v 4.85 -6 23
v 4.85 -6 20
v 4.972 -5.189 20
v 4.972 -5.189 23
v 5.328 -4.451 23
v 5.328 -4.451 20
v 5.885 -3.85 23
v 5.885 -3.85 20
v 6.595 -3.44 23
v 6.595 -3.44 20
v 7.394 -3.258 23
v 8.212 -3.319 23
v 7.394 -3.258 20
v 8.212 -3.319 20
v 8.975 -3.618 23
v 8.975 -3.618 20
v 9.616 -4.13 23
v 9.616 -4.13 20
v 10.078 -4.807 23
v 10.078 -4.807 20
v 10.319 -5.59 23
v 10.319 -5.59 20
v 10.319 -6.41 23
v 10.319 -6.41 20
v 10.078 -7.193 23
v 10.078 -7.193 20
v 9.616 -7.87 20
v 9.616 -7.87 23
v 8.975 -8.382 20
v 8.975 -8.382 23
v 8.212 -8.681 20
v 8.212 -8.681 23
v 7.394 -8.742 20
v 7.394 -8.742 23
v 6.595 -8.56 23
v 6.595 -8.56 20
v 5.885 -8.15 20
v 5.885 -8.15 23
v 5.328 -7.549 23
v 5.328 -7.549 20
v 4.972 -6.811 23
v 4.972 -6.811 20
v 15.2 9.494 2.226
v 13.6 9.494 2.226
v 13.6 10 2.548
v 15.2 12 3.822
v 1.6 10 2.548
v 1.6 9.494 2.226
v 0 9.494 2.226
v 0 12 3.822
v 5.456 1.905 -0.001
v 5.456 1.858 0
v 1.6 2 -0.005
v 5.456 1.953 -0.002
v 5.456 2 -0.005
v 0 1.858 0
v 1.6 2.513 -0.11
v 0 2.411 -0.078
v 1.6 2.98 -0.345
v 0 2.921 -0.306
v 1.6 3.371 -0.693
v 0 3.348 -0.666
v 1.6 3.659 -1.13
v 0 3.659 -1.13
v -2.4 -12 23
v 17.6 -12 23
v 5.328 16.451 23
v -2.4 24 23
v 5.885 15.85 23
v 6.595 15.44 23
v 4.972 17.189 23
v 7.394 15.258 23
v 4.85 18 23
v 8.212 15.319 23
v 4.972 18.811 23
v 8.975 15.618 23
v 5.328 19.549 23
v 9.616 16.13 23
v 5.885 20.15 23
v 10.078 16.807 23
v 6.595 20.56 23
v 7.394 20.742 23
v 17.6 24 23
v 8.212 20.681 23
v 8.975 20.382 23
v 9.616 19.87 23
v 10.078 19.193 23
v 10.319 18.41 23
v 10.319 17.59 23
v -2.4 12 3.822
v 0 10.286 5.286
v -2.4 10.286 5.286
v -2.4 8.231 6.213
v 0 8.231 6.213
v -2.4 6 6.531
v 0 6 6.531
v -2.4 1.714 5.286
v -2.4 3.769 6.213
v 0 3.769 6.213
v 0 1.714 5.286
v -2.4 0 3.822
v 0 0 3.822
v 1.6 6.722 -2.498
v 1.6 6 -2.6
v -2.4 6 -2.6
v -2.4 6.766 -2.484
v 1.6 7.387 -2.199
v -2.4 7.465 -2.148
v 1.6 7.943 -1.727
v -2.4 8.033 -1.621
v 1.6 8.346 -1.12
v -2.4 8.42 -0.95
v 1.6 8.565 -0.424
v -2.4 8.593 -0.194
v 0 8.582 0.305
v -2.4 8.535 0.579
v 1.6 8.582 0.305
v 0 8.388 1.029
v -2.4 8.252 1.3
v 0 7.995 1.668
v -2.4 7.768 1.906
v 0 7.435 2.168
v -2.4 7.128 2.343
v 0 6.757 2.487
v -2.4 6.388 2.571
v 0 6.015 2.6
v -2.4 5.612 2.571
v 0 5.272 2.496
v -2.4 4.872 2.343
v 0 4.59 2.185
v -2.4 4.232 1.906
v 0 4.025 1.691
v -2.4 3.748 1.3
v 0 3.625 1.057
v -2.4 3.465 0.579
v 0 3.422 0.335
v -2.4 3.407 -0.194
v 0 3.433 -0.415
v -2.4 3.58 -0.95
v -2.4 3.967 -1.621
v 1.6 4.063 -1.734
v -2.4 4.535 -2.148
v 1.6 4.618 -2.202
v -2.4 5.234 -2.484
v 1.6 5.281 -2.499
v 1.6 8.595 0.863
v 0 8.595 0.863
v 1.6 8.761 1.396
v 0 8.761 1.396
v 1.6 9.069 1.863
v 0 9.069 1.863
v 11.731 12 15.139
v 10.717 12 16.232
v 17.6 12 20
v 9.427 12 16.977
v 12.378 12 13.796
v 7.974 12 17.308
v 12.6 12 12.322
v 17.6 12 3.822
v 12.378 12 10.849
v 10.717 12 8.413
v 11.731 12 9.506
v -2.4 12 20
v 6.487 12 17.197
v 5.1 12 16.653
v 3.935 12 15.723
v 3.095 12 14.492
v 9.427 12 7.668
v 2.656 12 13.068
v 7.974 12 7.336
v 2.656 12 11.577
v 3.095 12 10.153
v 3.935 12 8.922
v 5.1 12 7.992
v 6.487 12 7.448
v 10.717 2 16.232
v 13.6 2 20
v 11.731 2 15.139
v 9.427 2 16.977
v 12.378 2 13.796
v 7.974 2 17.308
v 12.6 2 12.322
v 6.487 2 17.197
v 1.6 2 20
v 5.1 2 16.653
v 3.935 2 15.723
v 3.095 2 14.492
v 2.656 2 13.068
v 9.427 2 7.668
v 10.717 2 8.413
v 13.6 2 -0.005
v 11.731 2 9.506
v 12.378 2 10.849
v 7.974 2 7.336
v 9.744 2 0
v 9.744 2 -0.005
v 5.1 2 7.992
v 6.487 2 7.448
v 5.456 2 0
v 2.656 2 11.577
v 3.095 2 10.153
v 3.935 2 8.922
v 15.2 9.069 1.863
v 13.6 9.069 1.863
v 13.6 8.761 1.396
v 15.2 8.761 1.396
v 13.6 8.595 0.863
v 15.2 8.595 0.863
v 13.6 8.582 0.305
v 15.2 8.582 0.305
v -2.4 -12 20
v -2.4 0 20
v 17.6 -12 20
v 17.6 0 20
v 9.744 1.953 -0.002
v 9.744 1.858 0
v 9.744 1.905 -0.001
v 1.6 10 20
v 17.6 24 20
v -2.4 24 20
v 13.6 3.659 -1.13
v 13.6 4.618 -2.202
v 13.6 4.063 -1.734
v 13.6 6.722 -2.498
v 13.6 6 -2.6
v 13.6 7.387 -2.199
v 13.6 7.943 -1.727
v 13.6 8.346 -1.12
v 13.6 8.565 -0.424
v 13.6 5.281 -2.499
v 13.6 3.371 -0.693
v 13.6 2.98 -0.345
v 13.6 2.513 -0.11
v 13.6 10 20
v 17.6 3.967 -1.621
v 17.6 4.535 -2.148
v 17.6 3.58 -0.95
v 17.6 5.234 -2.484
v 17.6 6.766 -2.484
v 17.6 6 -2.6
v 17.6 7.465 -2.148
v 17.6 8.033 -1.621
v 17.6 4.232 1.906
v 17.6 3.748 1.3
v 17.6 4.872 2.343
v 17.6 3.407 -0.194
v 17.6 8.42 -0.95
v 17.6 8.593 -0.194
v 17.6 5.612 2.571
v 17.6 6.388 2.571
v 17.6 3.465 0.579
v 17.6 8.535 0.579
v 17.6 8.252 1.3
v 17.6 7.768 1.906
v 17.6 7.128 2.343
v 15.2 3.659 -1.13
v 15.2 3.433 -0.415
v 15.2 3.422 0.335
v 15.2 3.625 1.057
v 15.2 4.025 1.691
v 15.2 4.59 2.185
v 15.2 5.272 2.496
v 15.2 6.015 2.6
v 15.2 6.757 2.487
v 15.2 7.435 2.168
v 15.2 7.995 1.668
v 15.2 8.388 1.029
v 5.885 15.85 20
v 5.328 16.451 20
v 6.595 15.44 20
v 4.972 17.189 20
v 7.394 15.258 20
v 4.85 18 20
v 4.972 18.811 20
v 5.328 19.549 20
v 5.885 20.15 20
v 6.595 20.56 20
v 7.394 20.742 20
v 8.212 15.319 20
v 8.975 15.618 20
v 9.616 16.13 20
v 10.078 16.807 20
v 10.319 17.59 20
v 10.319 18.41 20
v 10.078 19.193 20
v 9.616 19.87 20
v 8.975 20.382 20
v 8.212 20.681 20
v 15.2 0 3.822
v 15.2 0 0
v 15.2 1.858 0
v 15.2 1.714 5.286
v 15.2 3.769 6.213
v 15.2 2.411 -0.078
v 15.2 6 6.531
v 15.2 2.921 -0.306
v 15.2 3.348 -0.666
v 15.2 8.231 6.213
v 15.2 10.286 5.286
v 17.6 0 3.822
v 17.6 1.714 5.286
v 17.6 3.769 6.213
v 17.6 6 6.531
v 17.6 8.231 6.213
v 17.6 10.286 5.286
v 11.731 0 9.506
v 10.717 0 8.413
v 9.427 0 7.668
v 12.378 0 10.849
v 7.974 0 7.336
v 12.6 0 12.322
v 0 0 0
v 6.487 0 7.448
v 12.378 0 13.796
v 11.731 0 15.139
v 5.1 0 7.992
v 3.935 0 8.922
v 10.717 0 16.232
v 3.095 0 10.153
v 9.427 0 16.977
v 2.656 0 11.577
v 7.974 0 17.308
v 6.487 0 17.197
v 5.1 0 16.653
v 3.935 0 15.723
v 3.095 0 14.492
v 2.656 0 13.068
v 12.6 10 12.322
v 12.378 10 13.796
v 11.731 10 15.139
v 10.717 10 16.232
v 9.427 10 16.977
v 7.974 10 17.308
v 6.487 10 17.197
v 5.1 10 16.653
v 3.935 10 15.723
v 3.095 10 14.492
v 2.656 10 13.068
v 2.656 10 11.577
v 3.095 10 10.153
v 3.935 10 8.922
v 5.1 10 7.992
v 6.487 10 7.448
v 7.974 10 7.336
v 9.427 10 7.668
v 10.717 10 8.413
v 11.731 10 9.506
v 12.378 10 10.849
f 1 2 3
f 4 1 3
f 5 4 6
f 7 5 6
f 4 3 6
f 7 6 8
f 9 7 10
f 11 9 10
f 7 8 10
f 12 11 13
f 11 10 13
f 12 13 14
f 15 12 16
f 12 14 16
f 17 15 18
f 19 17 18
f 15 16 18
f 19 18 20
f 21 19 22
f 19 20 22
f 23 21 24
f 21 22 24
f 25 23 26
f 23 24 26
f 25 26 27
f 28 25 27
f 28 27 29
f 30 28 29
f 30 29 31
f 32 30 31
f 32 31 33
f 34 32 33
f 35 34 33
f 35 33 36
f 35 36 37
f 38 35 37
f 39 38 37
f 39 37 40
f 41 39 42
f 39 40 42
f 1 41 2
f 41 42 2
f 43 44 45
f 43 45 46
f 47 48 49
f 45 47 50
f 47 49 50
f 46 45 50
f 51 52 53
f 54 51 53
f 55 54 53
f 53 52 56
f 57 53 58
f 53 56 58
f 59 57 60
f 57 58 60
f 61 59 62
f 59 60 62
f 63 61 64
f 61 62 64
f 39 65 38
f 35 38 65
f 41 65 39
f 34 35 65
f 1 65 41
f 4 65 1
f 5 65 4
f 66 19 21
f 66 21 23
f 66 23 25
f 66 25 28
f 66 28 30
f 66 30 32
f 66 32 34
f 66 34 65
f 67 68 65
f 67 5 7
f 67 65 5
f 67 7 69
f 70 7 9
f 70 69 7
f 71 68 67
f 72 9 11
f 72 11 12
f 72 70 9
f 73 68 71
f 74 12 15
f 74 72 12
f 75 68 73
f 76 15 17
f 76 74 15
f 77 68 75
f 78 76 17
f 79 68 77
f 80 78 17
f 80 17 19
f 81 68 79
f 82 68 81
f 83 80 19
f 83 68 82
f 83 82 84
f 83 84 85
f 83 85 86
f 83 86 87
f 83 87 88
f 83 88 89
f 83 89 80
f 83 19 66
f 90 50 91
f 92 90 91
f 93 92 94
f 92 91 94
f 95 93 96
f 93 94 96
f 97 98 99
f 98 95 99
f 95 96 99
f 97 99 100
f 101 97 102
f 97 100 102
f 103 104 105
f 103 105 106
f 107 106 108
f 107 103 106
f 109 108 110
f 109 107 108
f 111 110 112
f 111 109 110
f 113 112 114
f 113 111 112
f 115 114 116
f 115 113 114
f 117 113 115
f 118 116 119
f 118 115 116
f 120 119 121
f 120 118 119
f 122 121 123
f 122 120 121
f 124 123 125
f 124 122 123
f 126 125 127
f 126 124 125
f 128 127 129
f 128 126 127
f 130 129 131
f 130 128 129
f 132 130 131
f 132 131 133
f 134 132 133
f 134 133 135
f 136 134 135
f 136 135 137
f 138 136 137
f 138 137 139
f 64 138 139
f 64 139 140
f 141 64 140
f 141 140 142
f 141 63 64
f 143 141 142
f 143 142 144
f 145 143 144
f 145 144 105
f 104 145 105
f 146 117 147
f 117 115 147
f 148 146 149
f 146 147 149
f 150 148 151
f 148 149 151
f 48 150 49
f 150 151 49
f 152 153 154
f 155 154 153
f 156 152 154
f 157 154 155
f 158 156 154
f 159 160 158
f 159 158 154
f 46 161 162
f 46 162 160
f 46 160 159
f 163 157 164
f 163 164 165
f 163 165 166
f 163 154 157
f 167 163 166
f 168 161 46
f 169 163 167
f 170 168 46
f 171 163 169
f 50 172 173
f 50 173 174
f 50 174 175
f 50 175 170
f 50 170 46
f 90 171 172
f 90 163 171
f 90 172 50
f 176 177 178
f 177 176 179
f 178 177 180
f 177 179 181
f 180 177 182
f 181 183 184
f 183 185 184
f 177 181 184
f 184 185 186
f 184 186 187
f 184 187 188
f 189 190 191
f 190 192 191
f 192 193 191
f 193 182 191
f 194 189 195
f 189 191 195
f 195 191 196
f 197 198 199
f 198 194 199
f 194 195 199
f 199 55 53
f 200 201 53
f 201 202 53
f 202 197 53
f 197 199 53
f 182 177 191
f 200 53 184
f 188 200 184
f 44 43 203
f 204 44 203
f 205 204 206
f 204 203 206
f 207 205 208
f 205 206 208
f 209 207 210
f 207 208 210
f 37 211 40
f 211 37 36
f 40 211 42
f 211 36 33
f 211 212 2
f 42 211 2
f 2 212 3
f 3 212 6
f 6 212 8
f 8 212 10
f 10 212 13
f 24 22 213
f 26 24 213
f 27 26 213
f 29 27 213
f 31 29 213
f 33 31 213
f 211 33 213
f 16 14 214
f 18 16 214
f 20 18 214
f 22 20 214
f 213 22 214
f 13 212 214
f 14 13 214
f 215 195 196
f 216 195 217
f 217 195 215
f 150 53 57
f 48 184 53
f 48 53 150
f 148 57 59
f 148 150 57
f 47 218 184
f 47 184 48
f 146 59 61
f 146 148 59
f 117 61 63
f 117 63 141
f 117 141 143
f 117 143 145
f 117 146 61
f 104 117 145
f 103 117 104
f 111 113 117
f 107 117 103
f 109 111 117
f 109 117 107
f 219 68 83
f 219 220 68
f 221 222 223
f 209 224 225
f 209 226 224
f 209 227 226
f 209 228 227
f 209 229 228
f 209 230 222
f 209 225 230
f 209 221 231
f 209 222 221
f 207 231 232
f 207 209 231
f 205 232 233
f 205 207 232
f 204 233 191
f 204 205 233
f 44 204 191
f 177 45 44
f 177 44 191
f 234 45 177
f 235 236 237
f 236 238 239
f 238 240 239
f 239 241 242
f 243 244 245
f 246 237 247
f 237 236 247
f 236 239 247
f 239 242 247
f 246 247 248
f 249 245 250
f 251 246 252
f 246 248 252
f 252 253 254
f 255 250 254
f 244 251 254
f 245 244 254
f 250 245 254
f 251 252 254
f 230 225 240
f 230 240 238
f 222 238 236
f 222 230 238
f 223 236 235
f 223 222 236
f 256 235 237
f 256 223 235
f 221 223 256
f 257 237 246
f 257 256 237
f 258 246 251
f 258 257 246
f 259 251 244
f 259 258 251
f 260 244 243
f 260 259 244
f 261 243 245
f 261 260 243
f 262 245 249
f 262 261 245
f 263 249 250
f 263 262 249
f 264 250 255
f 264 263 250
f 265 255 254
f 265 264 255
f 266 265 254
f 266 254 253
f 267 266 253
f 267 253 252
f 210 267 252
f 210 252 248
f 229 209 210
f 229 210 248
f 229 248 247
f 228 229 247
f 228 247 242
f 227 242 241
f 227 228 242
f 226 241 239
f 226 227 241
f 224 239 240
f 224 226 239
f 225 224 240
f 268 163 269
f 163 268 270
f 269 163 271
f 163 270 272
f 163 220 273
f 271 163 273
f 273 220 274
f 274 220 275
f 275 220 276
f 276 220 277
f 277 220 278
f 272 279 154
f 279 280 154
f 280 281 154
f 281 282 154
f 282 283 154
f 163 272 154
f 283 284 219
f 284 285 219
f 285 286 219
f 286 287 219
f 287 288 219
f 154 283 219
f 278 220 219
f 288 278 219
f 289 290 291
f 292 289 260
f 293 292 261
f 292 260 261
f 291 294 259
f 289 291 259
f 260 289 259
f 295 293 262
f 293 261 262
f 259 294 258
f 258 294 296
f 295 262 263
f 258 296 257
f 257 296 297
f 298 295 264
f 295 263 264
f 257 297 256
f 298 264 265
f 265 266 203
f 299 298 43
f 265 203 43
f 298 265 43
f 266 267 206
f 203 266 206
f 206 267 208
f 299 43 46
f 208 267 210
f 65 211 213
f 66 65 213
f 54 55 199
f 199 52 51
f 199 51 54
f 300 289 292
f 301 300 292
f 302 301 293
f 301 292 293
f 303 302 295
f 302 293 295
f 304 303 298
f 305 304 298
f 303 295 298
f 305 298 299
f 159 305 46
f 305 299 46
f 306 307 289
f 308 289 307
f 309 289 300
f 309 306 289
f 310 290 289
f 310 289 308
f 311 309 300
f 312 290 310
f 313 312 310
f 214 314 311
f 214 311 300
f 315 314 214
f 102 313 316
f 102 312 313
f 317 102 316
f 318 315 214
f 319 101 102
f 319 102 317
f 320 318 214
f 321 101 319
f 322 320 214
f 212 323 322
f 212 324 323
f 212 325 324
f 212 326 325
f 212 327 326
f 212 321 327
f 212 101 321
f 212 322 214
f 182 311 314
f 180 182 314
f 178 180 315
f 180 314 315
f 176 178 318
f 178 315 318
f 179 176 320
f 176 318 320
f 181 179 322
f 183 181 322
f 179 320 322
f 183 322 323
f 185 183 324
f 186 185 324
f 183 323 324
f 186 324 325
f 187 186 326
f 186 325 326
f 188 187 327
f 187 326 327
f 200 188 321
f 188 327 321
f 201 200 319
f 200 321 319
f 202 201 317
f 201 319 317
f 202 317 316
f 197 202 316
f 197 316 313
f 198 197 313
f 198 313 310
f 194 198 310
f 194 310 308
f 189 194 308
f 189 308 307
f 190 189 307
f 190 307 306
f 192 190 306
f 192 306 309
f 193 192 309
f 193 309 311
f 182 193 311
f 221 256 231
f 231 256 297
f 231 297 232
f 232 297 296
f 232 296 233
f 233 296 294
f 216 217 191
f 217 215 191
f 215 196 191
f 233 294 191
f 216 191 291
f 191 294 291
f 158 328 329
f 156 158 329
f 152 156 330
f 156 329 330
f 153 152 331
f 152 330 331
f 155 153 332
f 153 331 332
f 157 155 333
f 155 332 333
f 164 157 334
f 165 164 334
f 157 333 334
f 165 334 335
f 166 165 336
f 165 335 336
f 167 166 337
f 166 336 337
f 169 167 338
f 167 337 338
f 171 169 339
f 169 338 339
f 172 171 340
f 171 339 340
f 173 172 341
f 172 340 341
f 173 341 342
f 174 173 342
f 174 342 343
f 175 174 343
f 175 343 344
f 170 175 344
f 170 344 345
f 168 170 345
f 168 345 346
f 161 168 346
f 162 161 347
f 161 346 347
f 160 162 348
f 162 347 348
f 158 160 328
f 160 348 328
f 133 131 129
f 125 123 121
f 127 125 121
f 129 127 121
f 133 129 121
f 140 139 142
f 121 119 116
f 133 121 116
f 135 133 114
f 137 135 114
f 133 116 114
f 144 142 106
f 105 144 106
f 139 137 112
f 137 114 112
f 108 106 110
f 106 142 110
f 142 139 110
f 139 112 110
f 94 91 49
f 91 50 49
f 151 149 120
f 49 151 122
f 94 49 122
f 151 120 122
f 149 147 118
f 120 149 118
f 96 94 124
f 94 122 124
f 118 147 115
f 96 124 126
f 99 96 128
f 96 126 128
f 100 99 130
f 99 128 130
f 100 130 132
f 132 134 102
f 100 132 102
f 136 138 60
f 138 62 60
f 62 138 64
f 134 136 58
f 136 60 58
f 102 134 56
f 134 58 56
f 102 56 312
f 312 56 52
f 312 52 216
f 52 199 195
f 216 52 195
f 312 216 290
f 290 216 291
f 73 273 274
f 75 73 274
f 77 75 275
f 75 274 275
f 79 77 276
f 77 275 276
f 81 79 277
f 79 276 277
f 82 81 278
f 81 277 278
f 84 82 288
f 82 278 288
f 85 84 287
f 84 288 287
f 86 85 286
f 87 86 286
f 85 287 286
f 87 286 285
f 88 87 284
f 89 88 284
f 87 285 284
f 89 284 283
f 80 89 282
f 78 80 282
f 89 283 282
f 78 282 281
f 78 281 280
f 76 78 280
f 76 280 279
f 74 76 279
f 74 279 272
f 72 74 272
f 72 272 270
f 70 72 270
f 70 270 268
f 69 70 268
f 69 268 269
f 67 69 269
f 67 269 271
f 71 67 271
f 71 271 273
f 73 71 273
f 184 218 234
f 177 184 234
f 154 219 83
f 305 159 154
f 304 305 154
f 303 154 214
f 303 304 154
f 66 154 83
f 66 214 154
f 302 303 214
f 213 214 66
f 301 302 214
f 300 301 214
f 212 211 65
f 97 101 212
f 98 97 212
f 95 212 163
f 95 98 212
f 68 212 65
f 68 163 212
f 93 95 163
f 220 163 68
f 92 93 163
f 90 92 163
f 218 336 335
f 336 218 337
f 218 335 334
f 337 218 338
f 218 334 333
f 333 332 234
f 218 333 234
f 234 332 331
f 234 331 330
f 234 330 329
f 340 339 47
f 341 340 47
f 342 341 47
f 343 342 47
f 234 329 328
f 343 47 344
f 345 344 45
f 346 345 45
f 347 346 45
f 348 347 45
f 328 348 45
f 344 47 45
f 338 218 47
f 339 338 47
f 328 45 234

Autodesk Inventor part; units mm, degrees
ref_plane "YZ Plane" through (0, 0, 0) normal (1, 0, 0) x (0, 1, 0)
sketch "Sketch1" plane through (0, 0, 0) normal (0, 0, 1) x (1, 0, 0)
  line L0 (0, 0) -> (15.2, 0)
  line L1 (15.2, 0) -> (15.2, 12)
  line L2 (15.2, 12) -> (0, 12)
  line L3 (0, 12) -> (0, 0)
  line L4 (1.6, 10) -> (13.6, 10)
  line L5 (13.6, 10) -> (13.6, 2)
  line L6 (13.6, 2) -> (1.6, 2)
  line L7 (1.6, 2) -> (1.6, 10)
  dimension "d0" = 15.2
  dimension "d1" = 12
  dimension "d2" = 1.6
  dimension "d3" = 2
  dimension "d4" = 2
  dimension "d5" = 1.6
extrude "Extrusion1" add sketch "Sketch1" along normal blind 20
sketch "Sketch2" plane through (0, 0, 0) normal (1, 0, 0) x (0, 1, 0)
  line L0 (0, 0) -> (12, 0) construction
  line L1 (6, 13.0663) -> (6, -2.0093) construction
  line L2 (0, 0) -> (0, 20) construction
  line L3 (12, 0) -> (12, 20) construction
  line L4 (6, 0) -> (12, 3.8224)
  line L5 (12, 3.8224) -> (12, 0)
  line L6 (12, 0) -> (6, 0)
  dimension "d8" = 12
  dimension "d9" = 6
  dimension "d10" = 32.5
extrude "Extrusion2" cut sketch "Sketch2" along normal through all
sketch "Sketch4" plane through (1.6, 2, 20) normal (1, 0, 0) x (0, 0, -1)
  circle A0 centre (20, 4) radius 2.6
  point P0 (20, -2)
  dimension "d14" = 5.2
extrude "Extrusion3" add sketch "Sketch4" against normal blind 4
sketch "Sketch5" plane through (0, 0, 20) normal (-1, 0, 0) x (0, 0, 1)
  line L0 (-20, 0) -> (0, 0) construction
  line L1 (0, 12) -> (0, 0) construction
  line L2 (-16.1776, 12) -> (0, 12) construction
  arc A0 (-16.1776, 0) -> (-16.1776, 12) centre (-21.4691, 6) ccw
  line L3 (-16.1776, 12) -> (0, 12)
  line L4 (0, 0) -> (-16.1776, 0)
  line L5 (0, 0) -> (0, 12)
  dimension "d17" = 8
extrude "Extrusion4" add sketch "Sketch5" along normal blind 2.4
ref_plane "Work Plane2" through (7.6, 2, 20) normal (1, 0, 0) x (0, 0, -1)
mirror "Mirror1" about plane through (7.6, 2, 20) normal (1, 0, 0) of "Extrusion3", "Extrusion4"
sketch "Sketch6" plane through (0, 0, 20) normal (0, 0, 1) x (1, 0, 0)
  line L0 (17.6, 0) -> (17.6, 12) construction
  line L1 (-2.4, 12) -> (17.6, 12) construction
  line L2 (-2.4, 0) -> (-2.4, 12) construction
  line L3 (-2.4, 0) -> (-2.4, 24)
  line L4 (-2.4, 24) -> (17.6, 24)
  line L5 (17.6, 24) -> (17.6, 0)
  line L6 (-2.4, 0) -> (-2.4, -12)
  line L7 (-2.4, -12) -> (17.6, -12)
  line L8 (17.6, -12) -> (17.6, 0)
  point P0 (0, 0)
  dimension "d21" = 12
  dimension "d22" = 12
extrude "Extrusion5" add sketch "Sketch6" along normal blind 3
sketch "Sketch7" plane through (0, 0, 0) normal (0, -1, 0) x (1, 0, 0)
  line L0 (17.6, 20) -> (-2.4, 20) construction
  line L1 (0, 0) -> (0, 3.8224) construction
  line L2 (7.6, 20) -> (7.6, -5.3429) construction
  circle A0 centre (7.6, 12.3224) radius 5
  line L3 (15.2, 3.8224) -> (0, 3.8224) construction
  dimension "d25" = 10
  dimension "d26" = 8.5
extrude "Extrusion6" cut sketch "Sketch7" against normal through all
sketch "Sketch8" plane through (0, 0, 20) normal (0, 0, -1) x (-1, 0, 0)
  line L0 (-17.6, -12) -> (2.4, -12) construction
  line L1 (2.4, -12) -> (2.4, 0) construction
  line L2 (-7.6, -12) -> (-7.6, 4.0518) construction
  circle A0 centre (-7.6, -6) radius 2.75
  point P0 (-17.6, 0)
  point P1 (0, 0)
  dimension "d29" = 12
  dimension "d30" = 6
  dimension "d31" = 5.5
extrude "Extrusion7" cut sketch "Sketch8" against normal through all
ref_plane "Work Plane3" through (0, 6, 0) normal (0, -1, 0) x (1, 0, 0)
mirror "Mirror2" about plane through (0, 6, 0) normal (0, -1, 0) of "Extrusion7"
fillet "Fillet1" radius 2 4 edges at (14.4, 8.1928, 1.397) (0.8, 8.1928, 1.397) (14.4, 3.4, 0) (0.8, 3.4, 0)
equation "\"d9\" = 0.5 * d8"
equation "\"d22\" = d21"
equation "\"d30\" = 0.5 * d29"
properties part number "chain_end_2020-back"
